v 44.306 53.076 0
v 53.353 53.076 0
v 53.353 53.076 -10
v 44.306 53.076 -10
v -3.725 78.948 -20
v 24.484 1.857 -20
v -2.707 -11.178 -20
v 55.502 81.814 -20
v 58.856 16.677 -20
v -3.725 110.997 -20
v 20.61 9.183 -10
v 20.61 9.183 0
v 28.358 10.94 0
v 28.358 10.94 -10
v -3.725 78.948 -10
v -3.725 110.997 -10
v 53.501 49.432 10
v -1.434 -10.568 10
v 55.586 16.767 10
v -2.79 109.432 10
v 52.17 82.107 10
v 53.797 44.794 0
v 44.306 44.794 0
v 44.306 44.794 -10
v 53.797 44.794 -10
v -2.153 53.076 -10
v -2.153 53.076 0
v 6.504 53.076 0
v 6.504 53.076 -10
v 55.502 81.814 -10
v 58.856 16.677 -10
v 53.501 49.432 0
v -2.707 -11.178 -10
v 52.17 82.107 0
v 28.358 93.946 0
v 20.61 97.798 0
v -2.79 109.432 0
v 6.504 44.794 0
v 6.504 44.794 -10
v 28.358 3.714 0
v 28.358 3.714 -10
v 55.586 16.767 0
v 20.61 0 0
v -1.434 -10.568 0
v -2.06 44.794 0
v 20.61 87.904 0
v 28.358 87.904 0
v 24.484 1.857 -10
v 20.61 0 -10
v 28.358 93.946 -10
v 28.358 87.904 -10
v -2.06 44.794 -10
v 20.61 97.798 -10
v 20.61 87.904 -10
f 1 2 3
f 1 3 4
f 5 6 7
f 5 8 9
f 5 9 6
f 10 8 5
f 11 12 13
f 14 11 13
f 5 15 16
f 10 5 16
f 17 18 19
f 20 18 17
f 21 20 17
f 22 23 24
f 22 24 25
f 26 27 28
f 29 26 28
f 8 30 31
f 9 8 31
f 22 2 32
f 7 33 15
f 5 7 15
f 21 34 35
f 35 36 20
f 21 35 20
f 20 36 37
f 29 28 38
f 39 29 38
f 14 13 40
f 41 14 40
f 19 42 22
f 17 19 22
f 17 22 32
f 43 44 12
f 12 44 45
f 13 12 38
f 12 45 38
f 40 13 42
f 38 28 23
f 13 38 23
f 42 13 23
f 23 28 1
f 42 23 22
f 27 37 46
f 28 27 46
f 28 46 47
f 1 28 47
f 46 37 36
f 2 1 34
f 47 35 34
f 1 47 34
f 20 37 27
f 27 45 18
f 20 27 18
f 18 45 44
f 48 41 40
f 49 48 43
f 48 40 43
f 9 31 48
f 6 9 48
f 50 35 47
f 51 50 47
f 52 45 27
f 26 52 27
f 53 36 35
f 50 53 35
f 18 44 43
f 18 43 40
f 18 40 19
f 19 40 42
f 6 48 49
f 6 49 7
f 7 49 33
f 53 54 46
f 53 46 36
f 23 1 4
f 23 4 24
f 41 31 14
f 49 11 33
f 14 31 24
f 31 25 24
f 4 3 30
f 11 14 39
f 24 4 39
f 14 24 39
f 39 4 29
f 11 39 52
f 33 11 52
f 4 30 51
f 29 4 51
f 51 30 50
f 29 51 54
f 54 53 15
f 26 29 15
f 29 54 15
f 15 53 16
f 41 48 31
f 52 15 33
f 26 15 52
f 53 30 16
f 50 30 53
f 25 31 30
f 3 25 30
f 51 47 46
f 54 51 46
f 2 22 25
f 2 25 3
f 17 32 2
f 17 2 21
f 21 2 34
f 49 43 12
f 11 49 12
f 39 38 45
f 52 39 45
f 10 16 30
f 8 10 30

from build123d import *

# Parameters (mm, degrees)
BOSS_EXTRUDE1_DEPTH = 10
BOSS_EXTRUDE2_DEPTH = 10
BOSS_EXTRUDE3_DEPTH = 10


with BuildPart() as part:
    # Sketch20 → Boss-Extrude1 (new body)
    with BuildSketch(Plane.XY):
        Polygon((-2.790049513, 109.432186673), (-1.434483855, -10.567813327), (55.586408616, 16.767282175), (53.501321505, 49.432186673), (52.169506721, 82.106882469), align=None)
    extrude(amount=BOSS_EXTRUDE1_DEPTH)

    # Sketch21 → Boss-Extrude2 (add)
    with BuildSketch(Plane(origin=(0, 0, 0), x_dir=(-1, 0, 0), z_dir=(0, 0, -1))):
        Polygon((2.153425382, 53.075716438), (-6.504020667, 53.075716438), (-6.504020667, 44.793833992), (2.059870087, 44.793833992), align=None)
        Polygon((-53.35281188, 53.075716438), (-44.305813439, 53.075716438), (-44.305813439, 44.793833992), (-53.797399805, 44.793833992), align=None)
        Polygon((-20.609929611, 0), (-20.609929611, 9.183356753), (-28.35805903, 10.939673778), (-28.35805903, 3.714355361), align=None)
        Polygon((-28.35805903, 93.945679874), (-28.35805903, 87.903711829), (-20.609929611, 87.903711829), (-20.609929611, 97.797967044), align=None)
    extrude(amount=BOSS_EXTRUDE2_DEPTH)

    # Sketch22 → Boss-Extrude3 (add)
    with BuildSketch(Plane(origin=(0, 0, -10), x_dir=(-1, 0, 0), z_dir=(0, 0, -1))):
        Polygon((-24.483994321, 1.85717768), (2.707182476, -11.177928968), (3.725282972, 78.948328543), (3.725282972, 110.997079558), (-55.502382997, 81.814284871), (-58.856312716, 16.677185524), align=None)
    extrude(amount=BOSS_EXTRUDE3_DEPTH)


solid = part.part
